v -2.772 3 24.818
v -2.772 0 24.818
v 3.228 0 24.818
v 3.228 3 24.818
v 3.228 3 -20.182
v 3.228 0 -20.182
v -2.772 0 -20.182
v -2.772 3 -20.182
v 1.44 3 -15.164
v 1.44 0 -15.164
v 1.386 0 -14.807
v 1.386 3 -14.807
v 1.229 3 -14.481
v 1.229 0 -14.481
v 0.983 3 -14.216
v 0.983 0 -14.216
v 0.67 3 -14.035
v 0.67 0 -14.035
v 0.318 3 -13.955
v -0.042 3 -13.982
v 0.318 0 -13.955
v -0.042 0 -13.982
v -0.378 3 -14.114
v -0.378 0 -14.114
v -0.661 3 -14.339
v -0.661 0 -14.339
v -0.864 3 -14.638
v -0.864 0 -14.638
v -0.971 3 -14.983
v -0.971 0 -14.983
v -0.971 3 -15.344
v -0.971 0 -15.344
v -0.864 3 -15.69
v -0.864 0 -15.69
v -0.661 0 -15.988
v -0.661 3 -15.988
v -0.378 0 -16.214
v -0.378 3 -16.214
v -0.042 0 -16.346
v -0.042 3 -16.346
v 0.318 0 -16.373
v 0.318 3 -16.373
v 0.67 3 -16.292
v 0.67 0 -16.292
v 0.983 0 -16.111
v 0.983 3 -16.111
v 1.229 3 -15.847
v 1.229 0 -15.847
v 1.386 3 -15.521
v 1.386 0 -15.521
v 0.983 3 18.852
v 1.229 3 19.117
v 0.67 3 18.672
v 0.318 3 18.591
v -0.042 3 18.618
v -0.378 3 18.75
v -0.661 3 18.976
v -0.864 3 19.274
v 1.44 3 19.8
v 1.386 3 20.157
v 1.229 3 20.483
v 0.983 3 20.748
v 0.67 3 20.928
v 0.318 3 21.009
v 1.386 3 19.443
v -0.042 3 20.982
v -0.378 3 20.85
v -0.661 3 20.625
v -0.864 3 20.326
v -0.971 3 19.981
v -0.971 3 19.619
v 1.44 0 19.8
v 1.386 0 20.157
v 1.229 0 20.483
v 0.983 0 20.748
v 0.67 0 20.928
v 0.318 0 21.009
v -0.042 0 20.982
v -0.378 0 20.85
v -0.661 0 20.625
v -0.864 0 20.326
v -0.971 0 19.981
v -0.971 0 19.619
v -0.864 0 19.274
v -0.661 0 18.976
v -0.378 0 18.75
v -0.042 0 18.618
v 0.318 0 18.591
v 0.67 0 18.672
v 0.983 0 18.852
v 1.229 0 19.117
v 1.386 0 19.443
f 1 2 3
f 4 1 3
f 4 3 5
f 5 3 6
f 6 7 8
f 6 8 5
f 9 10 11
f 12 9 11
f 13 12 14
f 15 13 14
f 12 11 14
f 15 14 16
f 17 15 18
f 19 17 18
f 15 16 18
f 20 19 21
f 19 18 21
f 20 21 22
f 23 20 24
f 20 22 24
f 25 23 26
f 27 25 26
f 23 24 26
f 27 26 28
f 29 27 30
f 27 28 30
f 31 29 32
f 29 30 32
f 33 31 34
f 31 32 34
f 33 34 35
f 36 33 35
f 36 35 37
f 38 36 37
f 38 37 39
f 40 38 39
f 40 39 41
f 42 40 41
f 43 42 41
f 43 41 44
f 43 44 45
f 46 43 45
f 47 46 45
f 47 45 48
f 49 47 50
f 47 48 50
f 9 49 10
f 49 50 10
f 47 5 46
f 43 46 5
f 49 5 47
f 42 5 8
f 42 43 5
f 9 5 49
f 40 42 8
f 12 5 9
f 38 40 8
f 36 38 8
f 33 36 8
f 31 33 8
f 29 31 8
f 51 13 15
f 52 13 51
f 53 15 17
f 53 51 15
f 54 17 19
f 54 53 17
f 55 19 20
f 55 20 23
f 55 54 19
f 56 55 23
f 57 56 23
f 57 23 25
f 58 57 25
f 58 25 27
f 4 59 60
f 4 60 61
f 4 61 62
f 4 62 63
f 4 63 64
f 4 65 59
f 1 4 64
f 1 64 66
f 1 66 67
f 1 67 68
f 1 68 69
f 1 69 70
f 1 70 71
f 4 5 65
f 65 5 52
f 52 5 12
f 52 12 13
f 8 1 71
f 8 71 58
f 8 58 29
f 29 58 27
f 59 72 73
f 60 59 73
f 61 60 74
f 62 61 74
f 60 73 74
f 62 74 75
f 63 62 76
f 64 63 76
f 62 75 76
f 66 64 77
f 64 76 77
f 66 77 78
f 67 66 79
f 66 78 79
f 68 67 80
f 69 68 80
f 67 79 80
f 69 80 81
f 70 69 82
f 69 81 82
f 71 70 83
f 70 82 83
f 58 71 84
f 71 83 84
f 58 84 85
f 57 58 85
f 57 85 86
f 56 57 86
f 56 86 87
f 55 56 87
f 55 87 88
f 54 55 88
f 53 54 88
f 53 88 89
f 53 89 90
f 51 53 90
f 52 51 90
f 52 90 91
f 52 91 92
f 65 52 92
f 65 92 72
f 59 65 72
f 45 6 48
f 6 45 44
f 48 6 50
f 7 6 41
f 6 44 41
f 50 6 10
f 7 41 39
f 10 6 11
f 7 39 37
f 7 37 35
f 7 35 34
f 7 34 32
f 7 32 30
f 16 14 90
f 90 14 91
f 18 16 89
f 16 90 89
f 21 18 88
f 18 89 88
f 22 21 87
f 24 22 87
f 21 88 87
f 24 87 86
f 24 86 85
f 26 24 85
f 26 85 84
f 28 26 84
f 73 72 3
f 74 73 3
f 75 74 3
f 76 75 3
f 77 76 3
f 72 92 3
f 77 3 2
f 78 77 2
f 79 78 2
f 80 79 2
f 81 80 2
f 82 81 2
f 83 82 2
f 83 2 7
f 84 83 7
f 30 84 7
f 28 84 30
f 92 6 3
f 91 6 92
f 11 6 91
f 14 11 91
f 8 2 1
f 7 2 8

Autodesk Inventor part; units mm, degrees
ref_plane "YZ Plane" through (0, 0, 0) normal (1, 0, 0) x (0, 1, 0)
ref_plane "XZ Plane" through (0, 0, 0) normal (0, 1, 0) x (-1, 0, 0)
ref_plane "XY Plane" through (0, 0, 0) normal (0, 0, 1) x (1, 0, 0)
sketch "Sketch1" plane through (0, 0, 0) normal (0, 1, 0) x (-1, 0, 0)
  point P0 (0, 0)
sketch "Sketch2" plane through (0, 0, 0) normal (0, 1, 0) x (-1, 0, 0)
  line L0 (2.7724, 24.8182) -> (-3.2276, 24.8182)
  line L1 (2.7724, 24.8182) -> (2.7724, -20.1818)
  line L2 (-3.2276, 24.8182) -> (-3.2276, -20.1818)
  line L3 (-3.2276, -20.1818) -> (-1.0276, -20.1818)
  line L4 (2.7724, -20.1818) -> (0.5724, -20.1818)
  line L5 (-1.0276, -20.1818) -> (0.5724, -20.1818)
  point P0 (0, 0)
  dimension "d0" = 6
  dimension "d1" = 45
  dimension "d2" = 45
  dimension "d3" = 2.2
  dimension "d4" = 2.2
extrude "Extrusion1" add sketch "Sketch2" along normal blind 3
sketch "Sketch4" plane through (0, 0, 0) normal (0, -1, 0) x (1, 0, 0)
  line L0 (-2.7724, 24.8182) -> (3.2276, 24.8182) projected
  circle A0 centre (0.2276, 19.8001) radius 1.2121
  line L1 (-2.7724, -20.1818) -> (-2.7724, 24.8182) projected
  circle A1 centre (0.2276, -15.1638) radius 1.2121
  point P0 (0, 0)
extrude "Extrusion3" cut sketch "Sketch4" against normal blind 10.9375 contours A0
extrude "Extrusion4" cut sketch "Sketch4" against normal blind 10.6375 contours A1
properties part number "LInk1"
